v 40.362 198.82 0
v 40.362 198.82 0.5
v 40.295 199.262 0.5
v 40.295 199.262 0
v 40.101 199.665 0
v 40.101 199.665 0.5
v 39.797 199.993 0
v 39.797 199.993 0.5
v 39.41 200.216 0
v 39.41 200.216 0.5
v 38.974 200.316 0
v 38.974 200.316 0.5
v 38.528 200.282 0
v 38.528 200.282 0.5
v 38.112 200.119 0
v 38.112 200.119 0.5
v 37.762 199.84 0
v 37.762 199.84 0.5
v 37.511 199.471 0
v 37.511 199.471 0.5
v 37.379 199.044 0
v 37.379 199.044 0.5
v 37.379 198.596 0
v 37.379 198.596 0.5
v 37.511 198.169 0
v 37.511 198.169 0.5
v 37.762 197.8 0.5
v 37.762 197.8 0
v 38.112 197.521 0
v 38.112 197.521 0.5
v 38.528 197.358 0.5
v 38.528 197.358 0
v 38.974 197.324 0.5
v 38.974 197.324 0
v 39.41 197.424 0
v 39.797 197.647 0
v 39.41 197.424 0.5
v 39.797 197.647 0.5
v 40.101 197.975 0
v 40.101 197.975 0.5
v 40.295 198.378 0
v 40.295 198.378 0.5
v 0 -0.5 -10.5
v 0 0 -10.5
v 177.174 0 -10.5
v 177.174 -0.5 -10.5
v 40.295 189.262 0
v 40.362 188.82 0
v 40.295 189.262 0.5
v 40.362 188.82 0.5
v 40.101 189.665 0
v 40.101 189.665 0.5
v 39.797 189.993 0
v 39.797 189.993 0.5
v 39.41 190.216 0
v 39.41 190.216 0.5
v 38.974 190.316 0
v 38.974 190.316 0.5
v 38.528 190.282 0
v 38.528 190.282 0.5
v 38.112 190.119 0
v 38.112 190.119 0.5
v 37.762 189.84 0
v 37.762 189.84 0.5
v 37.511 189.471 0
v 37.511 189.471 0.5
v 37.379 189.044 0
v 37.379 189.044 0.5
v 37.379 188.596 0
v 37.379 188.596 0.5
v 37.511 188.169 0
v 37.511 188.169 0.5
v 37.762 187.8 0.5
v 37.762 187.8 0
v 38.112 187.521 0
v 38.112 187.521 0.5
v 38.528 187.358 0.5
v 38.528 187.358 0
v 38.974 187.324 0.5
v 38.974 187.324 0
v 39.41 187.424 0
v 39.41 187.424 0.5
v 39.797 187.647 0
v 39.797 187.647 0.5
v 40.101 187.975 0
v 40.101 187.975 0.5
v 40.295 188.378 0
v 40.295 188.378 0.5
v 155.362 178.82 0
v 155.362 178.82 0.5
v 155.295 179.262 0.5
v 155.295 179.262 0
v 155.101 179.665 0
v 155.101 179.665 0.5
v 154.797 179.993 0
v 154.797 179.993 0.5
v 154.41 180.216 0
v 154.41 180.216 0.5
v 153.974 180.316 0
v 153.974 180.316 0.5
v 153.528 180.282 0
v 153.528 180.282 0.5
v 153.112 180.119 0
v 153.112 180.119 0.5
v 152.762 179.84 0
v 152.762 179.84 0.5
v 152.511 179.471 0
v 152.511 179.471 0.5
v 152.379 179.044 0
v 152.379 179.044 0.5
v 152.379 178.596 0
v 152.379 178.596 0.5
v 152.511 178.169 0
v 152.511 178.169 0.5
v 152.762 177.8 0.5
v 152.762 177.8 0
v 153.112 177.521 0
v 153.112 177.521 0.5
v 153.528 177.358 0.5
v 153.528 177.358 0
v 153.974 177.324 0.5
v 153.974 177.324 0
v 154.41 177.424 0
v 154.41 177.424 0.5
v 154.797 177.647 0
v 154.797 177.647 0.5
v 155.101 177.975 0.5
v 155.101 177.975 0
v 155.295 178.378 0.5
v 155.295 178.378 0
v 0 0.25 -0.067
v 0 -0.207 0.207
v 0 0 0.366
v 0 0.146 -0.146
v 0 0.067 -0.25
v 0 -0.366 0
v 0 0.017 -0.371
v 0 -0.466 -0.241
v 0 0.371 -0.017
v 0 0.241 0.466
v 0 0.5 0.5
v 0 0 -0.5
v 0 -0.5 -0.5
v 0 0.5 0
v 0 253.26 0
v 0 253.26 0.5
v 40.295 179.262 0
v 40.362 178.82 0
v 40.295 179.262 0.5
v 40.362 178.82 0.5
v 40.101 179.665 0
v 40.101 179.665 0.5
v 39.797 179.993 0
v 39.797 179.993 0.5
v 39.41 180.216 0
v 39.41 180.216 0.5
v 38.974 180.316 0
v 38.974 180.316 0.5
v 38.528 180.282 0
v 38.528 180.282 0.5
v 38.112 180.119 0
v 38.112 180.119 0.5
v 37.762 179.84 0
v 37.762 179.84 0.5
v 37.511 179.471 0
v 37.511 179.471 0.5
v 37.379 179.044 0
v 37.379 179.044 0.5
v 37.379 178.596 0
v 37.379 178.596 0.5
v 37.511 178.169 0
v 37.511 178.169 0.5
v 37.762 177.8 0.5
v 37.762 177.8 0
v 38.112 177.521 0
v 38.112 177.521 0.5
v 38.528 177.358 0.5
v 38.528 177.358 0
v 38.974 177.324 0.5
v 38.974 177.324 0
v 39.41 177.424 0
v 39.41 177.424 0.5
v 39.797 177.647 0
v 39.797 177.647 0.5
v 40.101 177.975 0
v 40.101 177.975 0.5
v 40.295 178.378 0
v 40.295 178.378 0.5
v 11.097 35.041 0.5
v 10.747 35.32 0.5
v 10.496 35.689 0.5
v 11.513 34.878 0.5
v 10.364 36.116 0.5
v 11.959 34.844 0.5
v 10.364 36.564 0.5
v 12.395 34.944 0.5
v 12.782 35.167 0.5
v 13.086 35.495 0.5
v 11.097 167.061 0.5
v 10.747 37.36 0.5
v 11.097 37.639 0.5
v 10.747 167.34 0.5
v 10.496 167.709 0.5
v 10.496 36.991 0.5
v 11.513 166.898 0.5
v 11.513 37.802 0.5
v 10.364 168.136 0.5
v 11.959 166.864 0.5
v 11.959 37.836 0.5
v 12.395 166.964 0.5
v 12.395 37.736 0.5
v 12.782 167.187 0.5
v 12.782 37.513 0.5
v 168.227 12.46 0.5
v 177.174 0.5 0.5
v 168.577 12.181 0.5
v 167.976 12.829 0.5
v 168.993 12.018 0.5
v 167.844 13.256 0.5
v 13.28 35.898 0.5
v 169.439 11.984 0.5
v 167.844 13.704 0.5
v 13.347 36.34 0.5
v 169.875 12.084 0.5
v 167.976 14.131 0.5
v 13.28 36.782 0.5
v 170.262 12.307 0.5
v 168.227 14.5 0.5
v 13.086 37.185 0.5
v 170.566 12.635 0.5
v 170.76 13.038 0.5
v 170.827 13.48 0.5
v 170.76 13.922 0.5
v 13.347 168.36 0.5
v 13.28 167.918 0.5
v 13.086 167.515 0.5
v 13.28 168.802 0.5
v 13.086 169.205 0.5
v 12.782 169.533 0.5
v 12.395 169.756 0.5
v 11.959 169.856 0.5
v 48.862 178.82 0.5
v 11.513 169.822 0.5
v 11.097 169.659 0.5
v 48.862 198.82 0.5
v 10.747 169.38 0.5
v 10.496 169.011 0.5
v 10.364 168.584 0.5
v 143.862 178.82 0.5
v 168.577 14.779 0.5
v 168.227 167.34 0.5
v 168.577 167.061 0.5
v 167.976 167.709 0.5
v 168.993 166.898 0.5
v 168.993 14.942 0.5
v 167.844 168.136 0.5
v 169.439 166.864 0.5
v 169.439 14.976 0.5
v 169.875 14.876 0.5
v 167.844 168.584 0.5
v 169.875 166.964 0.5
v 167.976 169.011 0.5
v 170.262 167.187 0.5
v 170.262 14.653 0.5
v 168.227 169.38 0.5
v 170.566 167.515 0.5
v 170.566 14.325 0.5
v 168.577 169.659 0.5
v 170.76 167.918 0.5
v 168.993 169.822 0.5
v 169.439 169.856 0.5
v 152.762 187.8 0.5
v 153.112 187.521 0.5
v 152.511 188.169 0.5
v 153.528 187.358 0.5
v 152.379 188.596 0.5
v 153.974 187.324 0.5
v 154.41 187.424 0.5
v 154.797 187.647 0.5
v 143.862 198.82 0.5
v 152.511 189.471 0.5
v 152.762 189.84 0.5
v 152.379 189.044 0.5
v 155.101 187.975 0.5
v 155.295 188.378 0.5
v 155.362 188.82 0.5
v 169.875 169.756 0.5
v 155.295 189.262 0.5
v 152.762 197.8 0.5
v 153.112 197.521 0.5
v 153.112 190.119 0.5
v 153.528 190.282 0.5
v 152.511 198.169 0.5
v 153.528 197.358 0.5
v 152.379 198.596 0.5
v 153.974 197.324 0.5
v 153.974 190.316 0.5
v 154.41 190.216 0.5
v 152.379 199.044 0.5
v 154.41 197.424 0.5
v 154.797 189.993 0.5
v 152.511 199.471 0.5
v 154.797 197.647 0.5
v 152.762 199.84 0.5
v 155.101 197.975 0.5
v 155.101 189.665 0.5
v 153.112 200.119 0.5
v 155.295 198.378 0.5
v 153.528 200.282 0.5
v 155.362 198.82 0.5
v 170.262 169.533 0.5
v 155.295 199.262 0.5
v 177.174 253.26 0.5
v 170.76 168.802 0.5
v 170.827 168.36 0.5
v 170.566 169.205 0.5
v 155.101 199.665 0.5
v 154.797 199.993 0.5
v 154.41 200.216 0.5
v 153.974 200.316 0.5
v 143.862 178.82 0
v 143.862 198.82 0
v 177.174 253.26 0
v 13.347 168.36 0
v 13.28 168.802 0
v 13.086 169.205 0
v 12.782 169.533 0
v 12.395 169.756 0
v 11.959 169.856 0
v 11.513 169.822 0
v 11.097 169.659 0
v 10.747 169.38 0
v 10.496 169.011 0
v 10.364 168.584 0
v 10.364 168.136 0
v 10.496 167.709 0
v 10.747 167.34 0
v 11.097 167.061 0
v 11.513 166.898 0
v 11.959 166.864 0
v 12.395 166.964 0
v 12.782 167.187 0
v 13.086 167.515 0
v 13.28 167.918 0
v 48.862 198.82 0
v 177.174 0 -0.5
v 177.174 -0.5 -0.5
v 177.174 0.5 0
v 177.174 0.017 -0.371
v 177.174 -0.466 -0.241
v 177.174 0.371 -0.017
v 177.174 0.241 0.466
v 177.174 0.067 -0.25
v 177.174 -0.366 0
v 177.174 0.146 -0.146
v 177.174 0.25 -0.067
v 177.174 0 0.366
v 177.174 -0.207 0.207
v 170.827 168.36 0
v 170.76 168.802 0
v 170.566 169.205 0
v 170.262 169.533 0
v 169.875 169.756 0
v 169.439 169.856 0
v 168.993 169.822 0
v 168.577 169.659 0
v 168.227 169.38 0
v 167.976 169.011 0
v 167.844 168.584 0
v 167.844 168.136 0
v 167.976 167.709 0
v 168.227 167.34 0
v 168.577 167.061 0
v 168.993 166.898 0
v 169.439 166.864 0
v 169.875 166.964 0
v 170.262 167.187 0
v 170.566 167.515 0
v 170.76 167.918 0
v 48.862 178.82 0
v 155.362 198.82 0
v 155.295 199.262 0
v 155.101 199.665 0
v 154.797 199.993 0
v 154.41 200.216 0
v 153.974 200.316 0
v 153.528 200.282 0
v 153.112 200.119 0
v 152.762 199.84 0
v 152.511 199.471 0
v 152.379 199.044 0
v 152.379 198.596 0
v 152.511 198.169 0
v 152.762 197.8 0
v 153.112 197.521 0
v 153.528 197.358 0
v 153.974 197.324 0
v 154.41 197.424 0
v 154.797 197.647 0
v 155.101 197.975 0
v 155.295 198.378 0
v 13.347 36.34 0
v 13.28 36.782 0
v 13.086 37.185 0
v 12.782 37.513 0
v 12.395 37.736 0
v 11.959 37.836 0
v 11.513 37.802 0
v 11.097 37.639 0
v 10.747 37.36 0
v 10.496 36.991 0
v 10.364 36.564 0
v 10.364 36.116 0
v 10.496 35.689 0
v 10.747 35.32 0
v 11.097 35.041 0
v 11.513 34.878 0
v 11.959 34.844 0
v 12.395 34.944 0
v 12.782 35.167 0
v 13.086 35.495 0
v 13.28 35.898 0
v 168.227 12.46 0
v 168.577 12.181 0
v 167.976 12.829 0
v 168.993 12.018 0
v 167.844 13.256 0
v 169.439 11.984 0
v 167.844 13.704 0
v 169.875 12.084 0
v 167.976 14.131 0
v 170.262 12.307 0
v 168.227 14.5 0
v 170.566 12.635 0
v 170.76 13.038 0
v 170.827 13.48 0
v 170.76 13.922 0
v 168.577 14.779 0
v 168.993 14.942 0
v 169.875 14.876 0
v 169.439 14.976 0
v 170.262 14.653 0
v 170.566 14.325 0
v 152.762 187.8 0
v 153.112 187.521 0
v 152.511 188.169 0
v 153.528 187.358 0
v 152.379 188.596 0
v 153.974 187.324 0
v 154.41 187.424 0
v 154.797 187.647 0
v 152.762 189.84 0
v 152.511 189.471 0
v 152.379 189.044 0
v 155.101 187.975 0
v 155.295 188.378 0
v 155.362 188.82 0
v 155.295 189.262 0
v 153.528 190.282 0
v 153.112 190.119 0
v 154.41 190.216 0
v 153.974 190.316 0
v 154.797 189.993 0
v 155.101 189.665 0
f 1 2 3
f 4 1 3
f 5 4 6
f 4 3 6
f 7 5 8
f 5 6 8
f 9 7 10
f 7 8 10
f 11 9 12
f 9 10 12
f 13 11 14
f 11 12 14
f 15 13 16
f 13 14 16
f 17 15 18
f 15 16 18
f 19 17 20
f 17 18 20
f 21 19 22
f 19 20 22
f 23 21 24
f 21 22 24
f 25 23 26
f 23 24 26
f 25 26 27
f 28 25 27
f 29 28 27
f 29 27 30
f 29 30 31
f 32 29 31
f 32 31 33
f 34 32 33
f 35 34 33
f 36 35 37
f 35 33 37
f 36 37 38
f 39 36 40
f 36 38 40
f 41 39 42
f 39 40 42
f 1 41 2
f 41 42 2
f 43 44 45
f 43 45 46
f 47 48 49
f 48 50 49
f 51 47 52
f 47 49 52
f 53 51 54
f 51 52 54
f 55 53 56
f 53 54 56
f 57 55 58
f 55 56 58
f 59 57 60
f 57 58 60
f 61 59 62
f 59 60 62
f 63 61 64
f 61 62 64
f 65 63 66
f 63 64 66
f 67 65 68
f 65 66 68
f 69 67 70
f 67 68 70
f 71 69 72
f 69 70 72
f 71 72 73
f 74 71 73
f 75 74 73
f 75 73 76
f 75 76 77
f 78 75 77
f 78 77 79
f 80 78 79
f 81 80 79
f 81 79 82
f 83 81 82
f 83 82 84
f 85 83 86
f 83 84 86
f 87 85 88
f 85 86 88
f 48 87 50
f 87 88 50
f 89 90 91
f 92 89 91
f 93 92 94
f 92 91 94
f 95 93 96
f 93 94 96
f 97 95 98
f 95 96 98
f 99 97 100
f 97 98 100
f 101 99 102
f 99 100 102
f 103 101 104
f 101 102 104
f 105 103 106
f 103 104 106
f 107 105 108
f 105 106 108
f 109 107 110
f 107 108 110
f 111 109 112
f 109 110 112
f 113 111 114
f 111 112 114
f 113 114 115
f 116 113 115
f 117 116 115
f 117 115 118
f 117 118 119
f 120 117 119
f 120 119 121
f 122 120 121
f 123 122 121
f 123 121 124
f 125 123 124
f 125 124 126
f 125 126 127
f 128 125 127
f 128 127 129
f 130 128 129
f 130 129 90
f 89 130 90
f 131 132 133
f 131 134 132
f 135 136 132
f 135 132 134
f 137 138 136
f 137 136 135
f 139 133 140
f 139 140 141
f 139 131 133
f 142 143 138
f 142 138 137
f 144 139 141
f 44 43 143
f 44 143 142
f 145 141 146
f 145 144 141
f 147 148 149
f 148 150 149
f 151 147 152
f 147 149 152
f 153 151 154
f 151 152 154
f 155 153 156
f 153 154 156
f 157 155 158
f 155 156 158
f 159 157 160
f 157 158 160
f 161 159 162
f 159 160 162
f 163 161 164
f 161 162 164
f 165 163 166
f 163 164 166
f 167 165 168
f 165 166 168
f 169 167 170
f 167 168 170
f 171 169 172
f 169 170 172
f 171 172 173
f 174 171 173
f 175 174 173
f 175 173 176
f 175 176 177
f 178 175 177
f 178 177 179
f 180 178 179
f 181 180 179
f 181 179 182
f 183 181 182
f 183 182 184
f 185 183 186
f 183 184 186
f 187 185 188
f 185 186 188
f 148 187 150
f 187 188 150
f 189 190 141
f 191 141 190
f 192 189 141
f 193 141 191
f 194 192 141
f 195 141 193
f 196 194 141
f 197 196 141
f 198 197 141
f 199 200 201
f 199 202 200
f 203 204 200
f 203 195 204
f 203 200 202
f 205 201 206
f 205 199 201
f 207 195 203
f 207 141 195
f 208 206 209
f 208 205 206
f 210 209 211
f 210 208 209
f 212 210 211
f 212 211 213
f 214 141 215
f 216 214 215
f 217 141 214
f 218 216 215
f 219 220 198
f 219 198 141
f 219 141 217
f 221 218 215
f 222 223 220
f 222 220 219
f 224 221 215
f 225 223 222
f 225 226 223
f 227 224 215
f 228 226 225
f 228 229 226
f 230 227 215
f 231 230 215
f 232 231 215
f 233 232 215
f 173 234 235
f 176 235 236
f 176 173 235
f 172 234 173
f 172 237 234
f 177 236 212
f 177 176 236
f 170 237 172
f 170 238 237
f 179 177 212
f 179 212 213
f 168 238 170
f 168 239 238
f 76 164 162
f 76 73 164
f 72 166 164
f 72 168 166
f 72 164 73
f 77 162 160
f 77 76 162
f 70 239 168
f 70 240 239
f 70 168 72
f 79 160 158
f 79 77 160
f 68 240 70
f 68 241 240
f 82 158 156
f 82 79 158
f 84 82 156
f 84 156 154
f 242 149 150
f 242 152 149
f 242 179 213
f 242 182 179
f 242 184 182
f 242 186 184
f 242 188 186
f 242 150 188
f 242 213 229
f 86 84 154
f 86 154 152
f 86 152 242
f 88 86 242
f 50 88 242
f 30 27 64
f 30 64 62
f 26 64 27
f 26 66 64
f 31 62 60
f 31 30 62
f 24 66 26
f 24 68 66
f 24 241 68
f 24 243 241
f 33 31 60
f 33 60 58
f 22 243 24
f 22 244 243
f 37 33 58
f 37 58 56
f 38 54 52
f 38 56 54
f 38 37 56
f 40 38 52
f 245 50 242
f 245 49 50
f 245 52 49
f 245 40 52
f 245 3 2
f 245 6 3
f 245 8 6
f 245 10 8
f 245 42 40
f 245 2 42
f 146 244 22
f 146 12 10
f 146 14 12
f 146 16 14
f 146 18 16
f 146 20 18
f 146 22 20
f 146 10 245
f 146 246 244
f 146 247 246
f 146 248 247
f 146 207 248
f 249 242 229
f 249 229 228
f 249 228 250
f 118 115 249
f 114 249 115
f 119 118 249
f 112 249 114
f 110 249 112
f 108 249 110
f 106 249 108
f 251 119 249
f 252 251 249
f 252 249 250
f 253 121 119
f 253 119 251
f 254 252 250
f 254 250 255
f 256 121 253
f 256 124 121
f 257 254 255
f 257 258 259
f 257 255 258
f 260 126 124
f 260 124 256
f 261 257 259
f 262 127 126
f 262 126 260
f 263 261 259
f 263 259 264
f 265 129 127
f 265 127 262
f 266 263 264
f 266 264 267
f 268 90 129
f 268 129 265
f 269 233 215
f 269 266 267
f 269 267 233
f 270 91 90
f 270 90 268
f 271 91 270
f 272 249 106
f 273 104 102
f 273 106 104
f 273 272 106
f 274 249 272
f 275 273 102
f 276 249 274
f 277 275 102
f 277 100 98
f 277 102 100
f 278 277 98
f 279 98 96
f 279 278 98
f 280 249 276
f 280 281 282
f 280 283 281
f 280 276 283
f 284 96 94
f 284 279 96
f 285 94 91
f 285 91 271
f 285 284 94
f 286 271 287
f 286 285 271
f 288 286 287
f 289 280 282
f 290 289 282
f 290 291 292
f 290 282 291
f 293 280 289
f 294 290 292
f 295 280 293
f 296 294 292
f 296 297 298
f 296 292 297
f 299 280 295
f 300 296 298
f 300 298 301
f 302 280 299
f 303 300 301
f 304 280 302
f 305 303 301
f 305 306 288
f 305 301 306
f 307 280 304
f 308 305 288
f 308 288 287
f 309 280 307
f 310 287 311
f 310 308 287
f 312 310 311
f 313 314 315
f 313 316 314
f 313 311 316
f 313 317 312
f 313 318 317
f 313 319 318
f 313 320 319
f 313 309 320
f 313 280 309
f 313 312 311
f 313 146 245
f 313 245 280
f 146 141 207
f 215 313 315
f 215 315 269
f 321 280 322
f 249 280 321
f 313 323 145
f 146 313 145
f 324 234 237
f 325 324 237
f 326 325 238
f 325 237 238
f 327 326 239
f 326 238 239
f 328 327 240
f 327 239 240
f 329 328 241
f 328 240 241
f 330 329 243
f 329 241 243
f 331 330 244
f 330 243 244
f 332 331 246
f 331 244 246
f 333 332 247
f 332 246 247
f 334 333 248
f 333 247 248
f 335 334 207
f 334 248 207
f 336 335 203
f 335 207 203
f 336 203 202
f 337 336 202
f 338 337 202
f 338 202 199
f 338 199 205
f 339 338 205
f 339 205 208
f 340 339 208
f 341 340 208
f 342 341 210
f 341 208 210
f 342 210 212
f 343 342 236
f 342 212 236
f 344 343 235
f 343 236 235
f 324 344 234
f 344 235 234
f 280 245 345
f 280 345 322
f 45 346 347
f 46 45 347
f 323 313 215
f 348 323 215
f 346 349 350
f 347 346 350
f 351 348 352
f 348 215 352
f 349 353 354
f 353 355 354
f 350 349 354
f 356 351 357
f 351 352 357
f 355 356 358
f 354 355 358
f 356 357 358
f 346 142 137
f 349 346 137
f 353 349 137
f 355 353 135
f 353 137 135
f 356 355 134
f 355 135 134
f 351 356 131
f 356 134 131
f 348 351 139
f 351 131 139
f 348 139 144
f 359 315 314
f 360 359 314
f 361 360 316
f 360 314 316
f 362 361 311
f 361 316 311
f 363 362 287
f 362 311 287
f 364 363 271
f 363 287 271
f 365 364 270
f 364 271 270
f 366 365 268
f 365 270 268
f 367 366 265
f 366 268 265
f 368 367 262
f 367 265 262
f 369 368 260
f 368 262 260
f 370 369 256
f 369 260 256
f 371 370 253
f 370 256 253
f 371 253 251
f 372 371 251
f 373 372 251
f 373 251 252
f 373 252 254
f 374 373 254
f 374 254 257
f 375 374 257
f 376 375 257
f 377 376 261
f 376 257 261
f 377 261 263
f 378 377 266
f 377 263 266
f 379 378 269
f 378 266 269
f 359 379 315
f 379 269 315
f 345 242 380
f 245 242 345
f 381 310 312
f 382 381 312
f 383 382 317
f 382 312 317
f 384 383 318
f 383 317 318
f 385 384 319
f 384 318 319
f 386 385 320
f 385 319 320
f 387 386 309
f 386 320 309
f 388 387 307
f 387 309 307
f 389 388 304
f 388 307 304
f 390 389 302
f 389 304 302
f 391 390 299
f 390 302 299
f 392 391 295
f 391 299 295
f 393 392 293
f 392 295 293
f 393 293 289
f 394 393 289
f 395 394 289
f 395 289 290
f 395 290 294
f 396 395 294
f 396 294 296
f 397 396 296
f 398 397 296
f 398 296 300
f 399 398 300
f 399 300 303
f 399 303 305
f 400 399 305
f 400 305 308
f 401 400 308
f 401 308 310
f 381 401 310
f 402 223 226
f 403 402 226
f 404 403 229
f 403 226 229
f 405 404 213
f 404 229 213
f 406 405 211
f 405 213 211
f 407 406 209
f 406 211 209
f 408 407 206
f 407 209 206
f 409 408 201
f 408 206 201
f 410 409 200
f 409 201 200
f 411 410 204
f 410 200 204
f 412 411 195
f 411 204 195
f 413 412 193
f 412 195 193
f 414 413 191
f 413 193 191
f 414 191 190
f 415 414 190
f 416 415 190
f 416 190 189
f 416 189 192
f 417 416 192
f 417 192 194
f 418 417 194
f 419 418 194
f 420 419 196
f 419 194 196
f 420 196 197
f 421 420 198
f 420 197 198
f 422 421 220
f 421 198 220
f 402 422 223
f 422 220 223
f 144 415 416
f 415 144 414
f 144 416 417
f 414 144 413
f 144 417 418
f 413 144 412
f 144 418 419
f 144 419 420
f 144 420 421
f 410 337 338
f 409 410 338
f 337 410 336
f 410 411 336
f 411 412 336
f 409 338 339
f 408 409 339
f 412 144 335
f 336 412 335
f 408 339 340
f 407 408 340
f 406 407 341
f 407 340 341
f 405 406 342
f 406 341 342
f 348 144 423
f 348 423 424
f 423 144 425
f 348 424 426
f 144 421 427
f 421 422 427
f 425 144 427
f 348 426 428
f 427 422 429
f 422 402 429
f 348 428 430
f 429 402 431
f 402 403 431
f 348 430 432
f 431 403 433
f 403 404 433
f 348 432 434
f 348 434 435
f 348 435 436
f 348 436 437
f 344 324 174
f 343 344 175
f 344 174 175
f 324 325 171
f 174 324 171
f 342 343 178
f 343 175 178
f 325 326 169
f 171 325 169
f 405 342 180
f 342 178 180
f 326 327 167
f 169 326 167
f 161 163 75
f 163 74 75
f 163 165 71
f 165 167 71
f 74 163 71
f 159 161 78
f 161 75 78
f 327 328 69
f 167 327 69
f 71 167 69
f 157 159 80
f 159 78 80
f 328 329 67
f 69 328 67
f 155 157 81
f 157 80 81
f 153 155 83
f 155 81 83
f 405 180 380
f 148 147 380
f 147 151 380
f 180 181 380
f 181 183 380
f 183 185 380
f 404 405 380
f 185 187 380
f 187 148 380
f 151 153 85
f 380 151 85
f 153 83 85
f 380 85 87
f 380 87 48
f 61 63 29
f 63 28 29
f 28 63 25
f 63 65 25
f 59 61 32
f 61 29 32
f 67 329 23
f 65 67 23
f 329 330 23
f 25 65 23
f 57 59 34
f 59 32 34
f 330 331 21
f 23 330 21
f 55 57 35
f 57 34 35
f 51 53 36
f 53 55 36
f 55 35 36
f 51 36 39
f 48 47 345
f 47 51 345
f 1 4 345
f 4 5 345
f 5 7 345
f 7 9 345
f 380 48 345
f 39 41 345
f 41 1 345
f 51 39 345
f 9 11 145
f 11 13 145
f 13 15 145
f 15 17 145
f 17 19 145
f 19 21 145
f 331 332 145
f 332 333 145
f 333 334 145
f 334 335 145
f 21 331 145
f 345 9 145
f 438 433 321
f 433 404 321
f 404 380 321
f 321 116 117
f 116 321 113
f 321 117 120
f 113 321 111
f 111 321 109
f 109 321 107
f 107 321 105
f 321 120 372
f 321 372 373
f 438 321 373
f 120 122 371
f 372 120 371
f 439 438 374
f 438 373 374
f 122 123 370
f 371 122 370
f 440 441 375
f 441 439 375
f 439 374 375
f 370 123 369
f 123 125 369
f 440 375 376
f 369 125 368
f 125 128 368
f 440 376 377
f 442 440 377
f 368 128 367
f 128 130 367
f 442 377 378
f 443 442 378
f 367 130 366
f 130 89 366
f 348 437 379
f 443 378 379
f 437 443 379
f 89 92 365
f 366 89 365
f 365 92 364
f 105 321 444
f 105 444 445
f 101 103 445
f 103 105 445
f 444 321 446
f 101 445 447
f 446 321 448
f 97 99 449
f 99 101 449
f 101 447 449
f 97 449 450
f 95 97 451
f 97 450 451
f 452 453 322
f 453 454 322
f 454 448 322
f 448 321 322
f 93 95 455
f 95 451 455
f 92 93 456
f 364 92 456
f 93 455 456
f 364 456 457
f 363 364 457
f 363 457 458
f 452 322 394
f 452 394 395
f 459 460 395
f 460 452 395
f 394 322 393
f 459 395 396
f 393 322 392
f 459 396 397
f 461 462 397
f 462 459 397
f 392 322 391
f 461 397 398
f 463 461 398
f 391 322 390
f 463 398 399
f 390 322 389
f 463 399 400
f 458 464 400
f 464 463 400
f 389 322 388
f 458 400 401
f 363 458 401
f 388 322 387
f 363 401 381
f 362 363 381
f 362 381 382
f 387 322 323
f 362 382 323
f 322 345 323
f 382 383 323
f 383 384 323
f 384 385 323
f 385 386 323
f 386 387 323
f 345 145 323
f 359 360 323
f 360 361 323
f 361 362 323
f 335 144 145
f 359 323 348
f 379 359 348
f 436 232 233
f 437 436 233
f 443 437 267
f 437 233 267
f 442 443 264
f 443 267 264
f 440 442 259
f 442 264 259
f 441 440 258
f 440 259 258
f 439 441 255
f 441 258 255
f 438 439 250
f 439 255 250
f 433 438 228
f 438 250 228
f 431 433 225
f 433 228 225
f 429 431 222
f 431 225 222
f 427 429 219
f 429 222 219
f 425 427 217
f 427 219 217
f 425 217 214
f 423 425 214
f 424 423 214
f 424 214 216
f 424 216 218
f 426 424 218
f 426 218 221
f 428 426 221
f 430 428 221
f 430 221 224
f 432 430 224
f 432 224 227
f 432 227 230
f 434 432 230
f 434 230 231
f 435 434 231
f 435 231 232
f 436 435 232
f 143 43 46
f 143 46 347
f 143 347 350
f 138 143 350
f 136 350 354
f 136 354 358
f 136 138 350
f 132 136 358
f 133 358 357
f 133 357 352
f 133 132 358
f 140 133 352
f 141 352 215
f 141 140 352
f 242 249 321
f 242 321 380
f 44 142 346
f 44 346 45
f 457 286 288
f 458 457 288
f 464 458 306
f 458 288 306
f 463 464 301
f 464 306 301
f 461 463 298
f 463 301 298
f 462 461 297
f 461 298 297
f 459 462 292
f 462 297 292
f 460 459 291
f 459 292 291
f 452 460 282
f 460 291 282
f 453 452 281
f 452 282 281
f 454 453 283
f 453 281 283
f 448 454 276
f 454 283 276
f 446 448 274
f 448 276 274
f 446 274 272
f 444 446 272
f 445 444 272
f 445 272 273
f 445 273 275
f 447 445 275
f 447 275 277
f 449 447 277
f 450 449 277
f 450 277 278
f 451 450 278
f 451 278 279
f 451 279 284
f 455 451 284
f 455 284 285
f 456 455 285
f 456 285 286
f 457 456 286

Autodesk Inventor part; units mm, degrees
ref_plane "YZ Plane" through (0, 0, 0) normal (1, 0, 0) x (0, 1, 0)
ref_plane "XZ Plane" through (0, 0, 0) normal (0, 1, 0) x (-1, 0, 0)
ref_plane "XY Plane" through (0, 0, 0) normal (0, 0, 1) x (1, 0, 0)
sketch "Sketch1" plane through (0, 0, 0) normal (0, 0, 1) x (1, 0, 0)
  line L0 (0, 0) -> (181.174, 0)
  line L1 (181.174, 0) -> (181.174, 253.26)
  line L2 (181.174, 253.26) -> (0, 253.26)
  line L3 (0, 253.26) -> (0, 0)
  dimension "d0" = 181.174
  dimension "d1" = 253.26
extrude "Plate1" add sketch "Sketch1" along normal blind 0.5
sketch "Sketch3" plane through (0, 0, 0.5) normal (0, 0, 1) x (1, 0, 0)
  line L0 (181.174, 253.26) -> (181.174, 0) projected
  line L1 (181.174, 253.26) -> (181.174, 168.36) construction
  line L2 (181.174, 168.36) -> (169.327, 168.36) construction
  line L3 (169.327, 168.36) -> (11.847, 168.36) construction
  line L4 (169.327, 168.36) -> (169.327, 13.48) construction
  circle A0 centre (169.327, 13.48) radius 1.5
  circle A1 centre (169.327, 168.36) radius 1.5
  circle A2 centre (11.847, 168.36) radius 1.5
  point P0 (181.174, 0.5)
  point P1 (0, 0)
  dimension "d13" = 84.9
  dimension "d14" = 11.847
  dimension "d15" = 157.48
  dimension "d16" = 154.88
  dimension "d17" = 3
  dimension "d18" = 3
  dimension "d19" = 3
extrude "Extrusion1" cut sketch "Sketch3" against normal blind 10
sketch "Sketch5" plane through (0, 0, 0.5) normal (0, 0, 1) x (1, 0, 0)
  circle A0 centre (11.847, 168.36) radius 1.5 projected
  line L0 (11.847, 168.36) -> (11.847, 35.808) construction
  line L1 (11.847, 168.36) -> (144.399, 168.36) construction
  line L2 (11.847, 35.808) -> (11.847, 36.34) construction
  circle A1 centre (11.847, 36.34) radius 1.5
  point P0 (0, 0)
  dimension "d28" = 90
  dimension "d32" = 0.532
  dimension "d33" = 3
extrude "Extrusion4" cut sketch "Sketch5" against normal blind 10 contours A1
sketch "Sketch7" plane through (0, 0, 0) normal (0, -1, 0) x (1, 0, 0)
  line L0 (181.174, 0) -> (0, 0)
  line L1 (0, 0) -> (0, -10.5)
  line L2 (0, -10.5) -> (181.174, -10.5)
  line L3 (181.174, -10.5) -> (181.174, 0)
edge flange "Flange2" height 11 angle 90 thickness 0.5 bend radius 0.5 thickness toward (0, -1, 0) relief tear relief width 0.5 relief depth 0.25 edges at (90.587, 0, 0) wall of the first edge with corners at (181.174, 0, 0) (0, 0, 0) (0, 0, -10.5) (181.174, 0, -10.5)
bend "Bend2"
corner "Corner2"
sketch "Sketch8" plane through (0, 0, 0.5) normal (0, 0, 1) x (1, 0, 0)
  line L0 (181.174, 253.26) -> (0, 253.26) projected
  line L1 (181.174, 253.26) -> (177.174, 253.26)
  line L2 (177.174, 253.26) -> (177.174, -19.1311)
  line L3 (177.174, -19.1311) -> (181.174, -19.1311)
  line L4 (181.174, -19.1311) -> (181.174, 253.26)
  point P0 (0, 0)
  dimension "d46" = 4
extrude "Extrusion5" cut sketch "Sketch8" against normal through all
sketch "Sketch9" plane through (0, 0, 0.5) normal (0, 0, 1) x (1, 0, 0)
  line L0 (177.174, 253.26) -> (177.174, 198.82) construction
  line L1 (177.174, 253.26) -> (177.174, 0.5) construction
  line L2 (177.174, 198.82) -> (153.862, 198.82) construction
  circle A0 centre (153.862, 198.82) radius 1.5
  line L3 (153.862, 198.82) -> (153.862, 188.82) construction
  line L4 (153.862, 188.82) -> (153.862, 178.82) construction
  circle A1 centre (153.862, 188.82) radius 1.5
  circle A2 centre (153.862, 178.82) radius 1.5
  line L5 (153.862, 198.82) -> (38.862, 198.82) construction
  circle A3 centre (38.862, 198.82) radius 1.5
  circle A4 centre (38.862, 188.82) radius 1.5
  circle A5 centre (38.862, 178.82) radius 1.5
  point P0 (0, 0)
  dimension "d49" = 54.44
  dimension "d50" = 23.312
  dimension "d55" = 3
  dimension "d58" = 10
  dimension "d59" = 10
  dimension "d60" = 3
  dimension "d61" = 3
  dimension "d62" = 115
  dimension "d63" = 3
  dimension "d64" = 3
  dimension "d65" = 3
extrude "Extrusion7" cut sketch "Sketch9" against normal blind 10
sketch "Sketch10" plane through (0, 0, 0.5) normal (0, 0, 1) x (1, 0, 0)
  circle A0 centre (153.862, 198.82) radius 1.5 projected
  circle A1 centre (38.862, 198.82) radius 1.5 projected
  line L0 (38.862, 198.82) -> (48.862, 198.82) construction
  line L1 (153.862, 198.82) -> (143.862, 198.82) construction
  line L2 (48.862, 198.82) -> (143.862, 198.82)
  line L3 (143.862, 198.82) -> (143.862, 178.82)
  line L4 (143.862, 178.82) -> (48.862, 178.82)
  line L5 (48.862, 178.82) -> (48.862, 198.82)
  point P0 (0, 0)
  dimension "d68" = 10
  dimension "d69" = 10
  dimension "d70" = 20
extrude "Extrusion8" cut sketch "Sketch10" against normal blind 10 contours L2 L3 L4 L5
equation "\"d2\" = Thickness"
equation "\"d36\" = BendReliefWidth"
equation "\"d37\" = BendReliefDepth"
equation "\"d38\" = MinimumRemnant"
equation "\"d39\" = TransitionRadius"
equation "\"d42\" = BendRadius"
equation "\"d43\" = CornerReliefSize"
equation "\"d44\" = GapSize"
equation "\"d45\" = JacobiRadiusSize"
equation "\"BendRadius\" = Thickness"
equation "\"BendReliefWidth\" = Thickness"
equation "\"BendReliefDepth\" = 0.5 * Thickness"
equation "\"CornerReliefSize\" = 4 * Thickness"
equation "\"MinimumRemnant\" = 2 * Thickness"
equation "\"TransitionRadius\" = BendRadius"
equation "\"JacobiRadiusSize\" = BendRadius"
equation "\"GapSize\" = Thickness"
equation "\"Thickness\" = 0.5"
properties part number "dads trunk"
